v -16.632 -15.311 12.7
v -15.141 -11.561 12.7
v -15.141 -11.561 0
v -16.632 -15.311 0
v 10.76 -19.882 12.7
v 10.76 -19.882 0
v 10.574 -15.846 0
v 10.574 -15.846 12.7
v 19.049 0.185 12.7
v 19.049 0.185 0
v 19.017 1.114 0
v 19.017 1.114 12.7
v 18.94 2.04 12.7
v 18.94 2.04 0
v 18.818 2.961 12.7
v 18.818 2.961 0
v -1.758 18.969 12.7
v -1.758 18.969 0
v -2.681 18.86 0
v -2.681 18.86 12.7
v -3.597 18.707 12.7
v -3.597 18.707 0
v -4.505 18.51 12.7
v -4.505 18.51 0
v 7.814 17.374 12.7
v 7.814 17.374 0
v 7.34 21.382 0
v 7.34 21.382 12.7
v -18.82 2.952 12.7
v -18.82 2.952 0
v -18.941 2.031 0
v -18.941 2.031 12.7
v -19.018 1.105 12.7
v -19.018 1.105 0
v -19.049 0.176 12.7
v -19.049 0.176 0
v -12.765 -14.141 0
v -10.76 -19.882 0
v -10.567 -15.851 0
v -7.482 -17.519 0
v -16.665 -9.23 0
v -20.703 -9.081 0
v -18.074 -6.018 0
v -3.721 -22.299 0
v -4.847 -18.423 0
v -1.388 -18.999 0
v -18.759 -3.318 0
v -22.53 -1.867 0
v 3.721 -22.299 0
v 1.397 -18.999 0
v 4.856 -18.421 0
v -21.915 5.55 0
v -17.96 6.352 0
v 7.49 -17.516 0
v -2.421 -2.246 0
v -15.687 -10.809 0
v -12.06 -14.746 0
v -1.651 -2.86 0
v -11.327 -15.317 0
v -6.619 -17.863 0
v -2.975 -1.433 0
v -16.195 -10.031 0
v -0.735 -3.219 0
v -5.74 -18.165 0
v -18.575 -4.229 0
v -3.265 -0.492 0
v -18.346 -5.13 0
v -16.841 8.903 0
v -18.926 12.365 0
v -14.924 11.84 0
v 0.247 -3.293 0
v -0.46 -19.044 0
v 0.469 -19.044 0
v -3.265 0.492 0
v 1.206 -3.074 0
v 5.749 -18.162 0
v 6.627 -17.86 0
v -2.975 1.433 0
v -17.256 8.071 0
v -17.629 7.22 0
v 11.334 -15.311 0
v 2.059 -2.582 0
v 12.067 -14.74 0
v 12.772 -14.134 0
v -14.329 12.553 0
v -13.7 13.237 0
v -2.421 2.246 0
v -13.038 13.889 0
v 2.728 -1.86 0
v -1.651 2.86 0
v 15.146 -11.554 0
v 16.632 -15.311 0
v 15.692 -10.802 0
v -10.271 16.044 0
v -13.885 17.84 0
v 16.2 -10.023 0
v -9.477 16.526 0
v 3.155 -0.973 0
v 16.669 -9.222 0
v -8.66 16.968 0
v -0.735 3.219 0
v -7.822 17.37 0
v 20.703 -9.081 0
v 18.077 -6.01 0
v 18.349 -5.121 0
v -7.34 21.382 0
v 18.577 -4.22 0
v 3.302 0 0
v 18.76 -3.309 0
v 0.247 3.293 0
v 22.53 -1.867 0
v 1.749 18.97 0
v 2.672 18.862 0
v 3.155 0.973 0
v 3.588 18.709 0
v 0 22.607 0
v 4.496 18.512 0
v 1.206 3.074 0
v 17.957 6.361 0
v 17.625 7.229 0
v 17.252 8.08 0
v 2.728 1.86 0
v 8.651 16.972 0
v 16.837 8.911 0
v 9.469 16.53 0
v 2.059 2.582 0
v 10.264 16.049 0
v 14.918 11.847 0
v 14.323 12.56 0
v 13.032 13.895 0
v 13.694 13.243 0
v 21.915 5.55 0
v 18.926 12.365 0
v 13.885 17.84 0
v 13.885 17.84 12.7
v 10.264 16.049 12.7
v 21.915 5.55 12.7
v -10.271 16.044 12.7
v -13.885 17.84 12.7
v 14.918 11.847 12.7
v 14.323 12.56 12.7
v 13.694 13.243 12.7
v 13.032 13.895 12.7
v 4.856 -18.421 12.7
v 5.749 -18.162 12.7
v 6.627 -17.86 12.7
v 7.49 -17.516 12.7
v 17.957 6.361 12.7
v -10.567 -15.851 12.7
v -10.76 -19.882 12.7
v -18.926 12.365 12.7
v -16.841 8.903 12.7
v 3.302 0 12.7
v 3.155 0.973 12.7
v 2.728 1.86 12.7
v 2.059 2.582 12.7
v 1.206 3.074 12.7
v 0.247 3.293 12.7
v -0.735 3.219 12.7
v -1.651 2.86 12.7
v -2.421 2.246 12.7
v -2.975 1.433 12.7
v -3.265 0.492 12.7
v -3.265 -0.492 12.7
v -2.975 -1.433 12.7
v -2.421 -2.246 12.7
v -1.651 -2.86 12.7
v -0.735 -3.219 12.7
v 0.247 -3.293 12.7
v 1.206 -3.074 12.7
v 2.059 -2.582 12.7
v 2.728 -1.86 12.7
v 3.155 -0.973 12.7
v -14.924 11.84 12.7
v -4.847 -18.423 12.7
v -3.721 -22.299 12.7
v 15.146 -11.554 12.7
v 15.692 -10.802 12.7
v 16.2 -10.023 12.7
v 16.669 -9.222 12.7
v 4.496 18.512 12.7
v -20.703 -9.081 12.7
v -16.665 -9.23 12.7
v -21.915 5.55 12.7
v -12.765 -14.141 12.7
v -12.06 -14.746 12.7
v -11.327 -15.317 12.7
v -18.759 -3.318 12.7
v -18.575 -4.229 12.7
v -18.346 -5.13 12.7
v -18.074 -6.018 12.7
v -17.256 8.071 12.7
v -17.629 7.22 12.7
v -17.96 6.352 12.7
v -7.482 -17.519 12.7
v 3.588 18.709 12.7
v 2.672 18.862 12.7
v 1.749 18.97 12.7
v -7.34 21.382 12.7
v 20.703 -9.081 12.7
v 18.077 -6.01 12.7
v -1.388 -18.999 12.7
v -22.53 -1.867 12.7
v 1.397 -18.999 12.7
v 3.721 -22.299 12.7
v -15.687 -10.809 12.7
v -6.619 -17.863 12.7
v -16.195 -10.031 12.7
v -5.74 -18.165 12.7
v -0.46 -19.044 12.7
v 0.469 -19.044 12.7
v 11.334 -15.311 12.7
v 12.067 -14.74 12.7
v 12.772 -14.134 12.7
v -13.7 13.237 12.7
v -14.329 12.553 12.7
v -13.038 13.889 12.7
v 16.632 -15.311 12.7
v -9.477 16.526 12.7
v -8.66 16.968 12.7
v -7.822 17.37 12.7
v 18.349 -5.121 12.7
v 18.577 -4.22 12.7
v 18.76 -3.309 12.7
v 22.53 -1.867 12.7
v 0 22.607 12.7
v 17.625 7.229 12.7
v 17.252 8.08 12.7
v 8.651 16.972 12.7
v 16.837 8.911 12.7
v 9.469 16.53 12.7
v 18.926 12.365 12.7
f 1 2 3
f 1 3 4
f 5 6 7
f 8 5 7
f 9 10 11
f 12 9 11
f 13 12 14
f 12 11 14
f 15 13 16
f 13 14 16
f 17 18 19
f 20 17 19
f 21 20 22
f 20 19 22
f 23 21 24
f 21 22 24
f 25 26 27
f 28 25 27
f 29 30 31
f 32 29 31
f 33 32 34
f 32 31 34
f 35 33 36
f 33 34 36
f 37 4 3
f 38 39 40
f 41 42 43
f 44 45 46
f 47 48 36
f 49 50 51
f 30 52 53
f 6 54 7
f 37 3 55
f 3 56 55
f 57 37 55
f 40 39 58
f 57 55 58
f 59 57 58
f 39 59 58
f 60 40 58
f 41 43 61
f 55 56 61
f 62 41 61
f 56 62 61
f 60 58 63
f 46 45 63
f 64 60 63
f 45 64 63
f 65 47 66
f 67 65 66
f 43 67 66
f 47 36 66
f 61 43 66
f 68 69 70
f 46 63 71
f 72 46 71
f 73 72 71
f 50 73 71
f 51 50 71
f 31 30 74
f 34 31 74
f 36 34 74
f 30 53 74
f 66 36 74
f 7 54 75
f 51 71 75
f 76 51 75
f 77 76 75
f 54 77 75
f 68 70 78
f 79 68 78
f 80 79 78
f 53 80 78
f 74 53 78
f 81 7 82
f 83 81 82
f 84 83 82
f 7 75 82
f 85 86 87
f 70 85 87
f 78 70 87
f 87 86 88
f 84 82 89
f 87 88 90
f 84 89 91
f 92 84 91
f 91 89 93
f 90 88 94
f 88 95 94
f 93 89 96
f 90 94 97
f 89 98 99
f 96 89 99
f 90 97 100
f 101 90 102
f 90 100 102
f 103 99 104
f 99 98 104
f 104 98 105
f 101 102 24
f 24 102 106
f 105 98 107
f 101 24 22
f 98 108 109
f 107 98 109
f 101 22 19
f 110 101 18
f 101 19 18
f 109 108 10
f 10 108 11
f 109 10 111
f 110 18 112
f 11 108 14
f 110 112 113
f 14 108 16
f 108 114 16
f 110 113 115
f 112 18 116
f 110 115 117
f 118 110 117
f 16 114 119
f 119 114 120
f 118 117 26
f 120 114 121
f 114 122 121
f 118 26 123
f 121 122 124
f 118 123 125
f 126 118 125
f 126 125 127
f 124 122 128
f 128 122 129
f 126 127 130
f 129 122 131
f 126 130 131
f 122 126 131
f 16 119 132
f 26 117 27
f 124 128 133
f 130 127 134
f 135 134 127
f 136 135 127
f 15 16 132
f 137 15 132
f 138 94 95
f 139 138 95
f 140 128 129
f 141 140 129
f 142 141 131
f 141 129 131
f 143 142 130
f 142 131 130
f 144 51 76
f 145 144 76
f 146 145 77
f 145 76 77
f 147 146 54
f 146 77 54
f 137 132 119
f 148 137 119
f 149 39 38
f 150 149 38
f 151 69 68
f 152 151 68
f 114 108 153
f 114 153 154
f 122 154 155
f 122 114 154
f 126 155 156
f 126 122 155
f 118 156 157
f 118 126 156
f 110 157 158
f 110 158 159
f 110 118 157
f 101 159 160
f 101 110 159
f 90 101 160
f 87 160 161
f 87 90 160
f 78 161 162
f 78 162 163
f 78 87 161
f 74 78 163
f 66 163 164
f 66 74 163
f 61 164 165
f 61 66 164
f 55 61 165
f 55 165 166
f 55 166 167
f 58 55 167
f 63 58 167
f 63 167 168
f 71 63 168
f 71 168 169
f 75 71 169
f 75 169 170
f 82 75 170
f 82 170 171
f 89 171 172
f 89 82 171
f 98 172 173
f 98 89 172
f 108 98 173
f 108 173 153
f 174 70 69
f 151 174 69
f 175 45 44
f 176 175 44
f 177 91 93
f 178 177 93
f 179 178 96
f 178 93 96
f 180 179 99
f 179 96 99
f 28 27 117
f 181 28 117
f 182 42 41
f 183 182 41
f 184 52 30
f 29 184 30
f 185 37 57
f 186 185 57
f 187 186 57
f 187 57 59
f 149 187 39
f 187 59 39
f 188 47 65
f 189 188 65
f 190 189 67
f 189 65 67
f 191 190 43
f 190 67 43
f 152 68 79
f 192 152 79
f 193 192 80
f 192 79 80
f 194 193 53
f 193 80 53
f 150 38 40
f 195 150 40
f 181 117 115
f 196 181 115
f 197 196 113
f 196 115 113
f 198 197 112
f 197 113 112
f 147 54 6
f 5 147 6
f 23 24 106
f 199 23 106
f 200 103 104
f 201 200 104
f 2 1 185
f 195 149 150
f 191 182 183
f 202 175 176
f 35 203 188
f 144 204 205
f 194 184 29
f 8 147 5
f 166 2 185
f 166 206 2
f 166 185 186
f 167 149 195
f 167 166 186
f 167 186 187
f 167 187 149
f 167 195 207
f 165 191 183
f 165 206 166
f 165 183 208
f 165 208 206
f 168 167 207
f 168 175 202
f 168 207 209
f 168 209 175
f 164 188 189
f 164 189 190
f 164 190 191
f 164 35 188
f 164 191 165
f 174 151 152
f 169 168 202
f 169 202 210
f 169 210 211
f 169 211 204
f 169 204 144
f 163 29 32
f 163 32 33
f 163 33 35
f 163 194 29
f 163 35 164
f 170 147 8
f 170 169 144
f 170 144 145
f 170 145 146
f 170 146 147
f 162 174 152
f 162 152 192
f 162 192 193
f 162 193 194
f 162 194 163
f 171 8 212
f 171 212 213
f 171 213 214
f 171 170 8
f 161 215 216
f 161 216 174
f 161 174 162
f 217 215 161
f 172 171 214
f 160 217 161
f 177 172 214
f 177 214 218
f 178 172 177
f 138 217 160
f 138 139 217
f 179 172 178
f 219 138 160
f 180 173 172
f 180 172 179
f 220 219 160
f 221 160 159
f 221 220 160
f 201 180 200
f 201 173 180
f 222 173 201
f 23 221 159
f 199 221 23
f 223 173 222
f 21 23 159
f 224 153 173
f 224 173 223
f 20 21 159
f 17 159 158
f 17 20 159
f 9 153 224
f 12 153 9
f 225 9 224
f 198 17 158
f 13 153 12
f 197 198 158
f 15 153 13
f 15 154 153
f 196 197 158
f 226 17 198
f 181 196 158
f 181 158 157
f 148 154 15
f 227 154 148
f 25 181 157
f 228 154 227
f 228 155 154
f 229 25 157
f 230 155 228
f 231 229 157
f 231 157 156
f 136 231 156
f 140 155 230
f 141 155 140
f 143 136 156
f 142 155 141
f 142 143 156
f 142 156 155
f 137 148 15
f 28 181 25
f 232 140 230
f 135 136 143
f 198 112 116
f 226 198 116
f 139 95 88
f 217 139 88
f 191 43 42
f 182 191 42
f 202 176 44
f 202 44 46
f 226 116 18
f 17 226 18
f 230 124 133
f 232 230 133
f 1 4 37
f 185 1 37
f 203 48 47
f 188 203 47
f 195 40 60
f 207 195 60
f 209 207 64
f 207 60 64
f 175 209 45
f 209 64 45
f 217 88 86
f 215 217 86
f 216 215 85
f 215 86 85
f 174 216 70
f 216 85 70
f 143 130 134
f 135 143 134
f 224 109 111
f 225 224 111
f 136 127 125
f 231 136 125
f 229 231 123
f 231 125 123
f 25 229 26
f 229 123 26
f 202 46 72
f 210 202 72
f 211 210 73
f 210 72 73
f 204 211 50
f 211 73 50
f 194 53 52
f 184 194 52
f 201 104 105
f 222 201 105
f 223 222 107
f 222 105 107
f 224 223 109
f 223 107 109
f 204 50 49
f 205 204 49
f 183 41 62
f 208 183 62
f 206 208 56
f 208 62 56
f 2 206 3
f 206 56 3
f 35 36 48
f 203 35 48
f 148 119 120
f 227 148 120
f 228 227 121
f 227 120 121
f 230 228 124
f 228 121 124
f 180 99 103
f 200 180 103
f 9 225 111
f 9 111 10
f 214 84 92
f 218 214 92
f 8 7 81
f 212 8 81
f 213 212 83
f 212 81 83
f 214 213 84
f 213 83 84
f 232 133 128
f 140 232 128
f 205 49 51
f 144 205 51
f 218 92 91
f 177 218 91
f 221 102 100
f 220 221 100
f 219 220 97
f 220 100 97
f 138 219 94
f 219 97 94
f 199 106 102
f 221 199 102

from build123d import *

# Parameters (mm, degrees)
F0_R     = 3.302
F1_DEPTH = 12.7


with BuildPart() as f1:
    # F0 (on Top) → F1 (new body)
    with BuildSketch(Plane.XY):
        with BuildLine():
            Line((20.702864, -9.081118), (17.445482, -7.652298))
            ThreePointArc((17.445482, -7.652298), (17.075406, -8.445887), (16.669253, -9.221632))
            Line((16.669253, -9.221632), (20.702864, -9.081118))
        make_face()
        with BuildLine():
            Line((-22.52976, -1.866869), (-18.984935, -1.573137))
            ThreePointArc((-18.984935, -1.573137), (-19.037169, -0.699059), (-19.049182, 0.176495))
            Line((-19.049182, 0.176495), (-22.52976, -1.866869))
        make_face()
        with BuildLine():
            Line((-22.52976, -1.866869), (-18.75876, -3.318344))
            ThreePointArc((-18.75876, -3.318344), (-18.892011, -2.448353), (-18.984935, -1.573137))
            Line((-18.984935, -1.573137), (-22.52976, -1.866869))
        make_face()
        with BuildLine():
            Line((3.720986, -22.298645), (3.135527, -18.790183))
            ThreePointArc((3.135527, -18.790183), (2.268748, -18.91442), (1.397176, -18.998695))
            Line((1.397176, -18.998695), (3.720986, -22.298645))
        make_face()
        with BuildLine():
            Line((20.702864, -9.081118), (18.077194, -6.009787))
            ThreePointArc((18.077194, -6.009787), (17.780315, -6.838341), (17.445482, -7.652298))
            Line((17.445482, -7.652298), (20.702864, -9.081118))
        make_face()
        with BuildLine():
            Line((-3.720986, -22.298645), (-3.135527, -18.790183))
            ThreePointArc((-3.135527, -18.790183), (-3.995681, -18.626246), (-4.847393, -18.422955))
            Line((-4.847393, -18.422955), (-3.720986, -22.298645))
        make_face()
        with BuildLine():
            Line((-20.702864, -9.081118), (-17.445482, -7.652298))
            ThreePointArc((-17.445482, -7.652298), (-17.778699, -6.842541), (-18.074353, -6.018327))
            Line((-18.074353, -6.018327), (-20.702864, -9.081118))
        make_face()
        with BuildLine():
            Line((22.52976, -1.866869), (18.984935, -1.573137))
            ThreePointArc((18.984935, -1.573137), (18.892588, -2.44389), (18.760326, -3.309481))
            Line((18.760326, -3.309481), (22.52976, -1.866869))
        make_face()
        with BuildLine():
            Line((3.720986, -22.298645), (4.856096, -18.420663))
            ThreePointArc((4.856096, -18.420663), (4.000081, -18.625301), (3.135527, -18.790183))
            Line((3.135527, -18.790183), (3.720986, -22.298645))
        make_face()
        with BuildLine():
            Line((-3.720986, -22.298645), (-1.3882, -18.999353))
            ThreePointArc((-1.3882, -18.999353), (-2.26428, -18.914955), (-3.135527, -18.790183))
            Line((-3.135527, -18.790183), (-3.720986, -22.298645))
        make_face()
        with BuildLine():
            ThreePointArc((19.049097, 0.185495), (19.049774, 0.092749), (19.05, 0))
            ThreePointArc((19.05, 0), (19.033727, -0.787241), (18.984935, -1.573137))
            Line((18.984935, -1.573137), (22.52976, -1.866869))
            Line((22.52976, -1.866869), (19.049097, 0.185495))
        make_face()
        with BuildLine():
            Line((-20.702864, -9.081118), (-16.664895, -9.229506))
            ThreePointArc((-16.664895, -9.229506), (-17.07341, -8.44992), (-17.445482, -7.652298))
            Line((-17.445482, -7.652298), (-20.702864, -9.081118))
        make_face()
        with BuildLine():
            ThreePointArc((-15.948021, 10.419362), (-15.452372, 11.141216), (-14.924076, 11.83953))
            Line((-14.924076, 11.83953), (-18.925801, 12.364843))
            Line((-18.925801, 12.364843), (-15.948021, 10.419362))
        make_face()
        with BuildLine():
            ThreePointArc((-11.700752, 15.033127), (-10.997573, 15.554931), (-10.271159, 16.043871))
            Line((-10.271159, 16.043871), (-13.885491, 17.840079))
            Line((-13.885491, 17.840079), (-11.700752, 15.033127))
        make_face()
        with BuildLine():
            ThreePointArc((-16.841467, 8.90323), (-16.412261, 9.671618), (-15.948021, 10.419362))
            Line((-15.948021, 10.419362), (-18.925801, 12.364843))
            Line((-18.925801, 12.364843), (-16.841467, 8.90323))
        make_face()
        with BuildLine():
            ThreePointArc((-13.038076, 13.889243), (-12.38263, 14.476636), (-11.700752, 15.033127))
            Line((-11.700752, 15.033127), (-13.885491, 17.840079))
            Line((-13.885491, 17.840079), (-13.038076, 13.889243))
        make_face()
        with BuildLine():
            ThreePointArc((18.467075, 4.676499), (18.662466, 3.82294), (18.818427, 2.961304))
            Line((18.818427, 2.961304), (21.915207, 5.549684))
            Line((21.915207, 5.549684), (18.467075, 4.676499))
        make_face()
        with BuildLine():
            ThreePointArc((17.956734, 6.360676), (18.231363, 5.524484), (18.467075, 4.676499))
            Line((18.467075, 4.676499), (21.915207, 5.549684))
            Line((21.915207, 5.549684), (17.956734, 6.360676))
        make_face()
        with BuildLine():
            ThreePointArc((15.948021, 10.419362), (16.409975, 9.675495), (16.837258, 8.911186))
            Line((16.837258, 8.911186), (18.925801, 12.364843))
            Line((18.925801, 12.364843), (15.948021, 10.419362))
        make_face()
        with BuildLine():
            ThreePointArc((14.91848, 11.846579), (15.44974, 11.144866), (15.948021, 10.419362))
            Line((15.948021, 10.419362), (18.925801, 12.364843))
            Line((18.925801, 12.364843), (14.91848, 11.846579))
        make_face()
        with BuildLine():
            ThreePointArc((11.700752, 15.033127), (12.37921, 14.47956), (13.031512, 13.895402))
            Line((13.031512, 13.895402), (13.885491, 17.840079))
            Line((13.885491, 17.840079), (11.700752, 15.033127))
        make_face()
        with BuildLine():
            ThreePointArc((10.263578, 16.048722), (10.993899, 15.557528), (11.700752, 15.033127))
            Line((11.700752, 15.033127), (13.885491, 17.840079))
            Line((13.885491, 17.840079), (10.263578, 16.048722))
        make_face()
        with BuildLine():
            ThreePointArc((6.185525, 18.017818), (7.006964, 17.714541), (7.813599, 17.373836))
            Line((7.813599, 17.373836), (7.340473, 21.382066))
            Line((7.340473, 21.382066), (6.185525, 18.017818))
        make_face()
        with BuildLine():
            ThreePointArc((4.496458, 18.511736), (5.346698, 18.284292), (6.185525, 18.017818))
            Line((6.185525, 18.017818), (7.340473, 21.382066))
            Line((7.340473, 21.382066), (4.496458, 18.511736))
        make_face()
        with BuildLine():
            ThreePointArc((0, 19.05), (0.875406, 19.029876), (1.748962, 18.969545))
            Line((1.748962, 18.969545), (0, 22.606974))
            Line((0, 22.606974), (0, 19.05))
        make_face()
        with BuildLine():
            ThreePointArc((-1.757924, 18.968716), (-0.879901, 19.029668), (0, 19.05))
            Line((0, 19.05), (0, 22.606974))
            Line((0, 22.606974), (-1.757924, 18.968716))
        make_face()
        with BuildLine():
            ThreePointArc((-6.185525, 18.017818), (-5.351017, 18.283028), (-4.505203, 18.50961))
            Line((-4.505203, 18.50961), (-7.340473, 21.382066))
            Line((-7.340473, 21.382066), (-6.185525, 18.017818))
        make_face()
        with BuildLine():
            ThreePointArc((-7.821807, 17.370142), (-7.011149, 17.712885), (-6.185525, 18.017818))
            Line((-6.185525, 18.017818), (-7.340473, 21.382066))
            Line((-7.340473, 21.382066), (-7.821807, 17.370142))
        make_face()
        with BuildLine():
            Line((-16.632492, -15.311287), (-14.01554, -12.902214))
            ThreePointArc((-14.01554, -12.902214), (-14.593631, -12.244527), (-15.140887, -11.56097))
            Line((-15.140887, -11.56097), (-16.632492, -15.311287))
        make_face()
        with BuildLine():
            ThreePointArc((-18.467075, 4.676499), (-18.232667, 5.520177), (-17.959737, 6.352192))
            Line((-17.959737, 6.352192), (-21.915207, 5.549684))
            Line((-21.915207, 5.549684), (-18.467075, 4.676499))
        make_face()
        with BuildLine():
            Line((16.632492, -15.311287), (14.01554, -12.902214))
            ThreePointArc((14.01554, -12.902214), (13.407838, -13.532641), (12.771808, -14.134476))
            Line((12.771808, -14.134476), (16.632492, -15.311287))
        make_face()
        with BuildLine():
            Line((-16.632492, -15.311287), (-12.765129, -14.140509))
            ThreePointArc((-12.765129, -14.140509), (-13.404641, -13.535808), (-14.01554, -12.902214))
            Line((-14.01554, -12.902214), (-16.632492, -15.311287))
        make_face()
        with BuildLine():
            ThreePointArc((-18.819824, 2.952413), (-18.663368, 3.818531), (-18.467075, 4.676499))
            Line((-18.467075, 4.676499), (-21.915207, 5.549684))
            Line((-21.915207, 5.549684), (-18.819824, 2.952413))
        make_face()
        with BuildLine():
            Line((16.632492, -15.311287), (15.146348, -11.553816))
            ThreePointArc((15.146348, -11.553816), (14.596523, -12.241079), (14.01554, -12.902214))
            Line((14.01554, -12.902214), (16.632492, -15.311287))
        make_face()
        with BuildLine():
            ThreePointArc((18.984935, -1.573137), (19.033727, -0.787241), (19.05, 0))
            ThreePointArc((19.05, 0), (19.049774, 0.092749), (19.049097, 0.185495))
            ThreePointArc((19.049097, 0.185495), (18.984562, 1.577621), (18.818427, 2.961304))
            ThreePointArc((18.818427, 2.961304), (18.662466, 3.82294), (18.467075, 4.676499))
            ThreePointArc((18.467075, 4.676499), (18.231363, 5.524484), (17.956734, 6.360676))
            ThreePointArc((17.956734, 6.360676), (17.443674, 7.656419), (16.837258, 8.911186))
            ThreePointArc((16.837258, 8.911186), (16.409975, 9.675495), (15.948021, 10.419362))
            ThreePointArc((15.948021, 10.419362), (15.44974, 11.144866), (14.91848, 11.846579))
            ThreePointArc((14.91848, 11.846579), (14.012492, 12.905524), (13.031512, 13.895402))
            ThreePointArc((13.031512, 13.895402), (12.37921, 14.47956), (11.700752, 15.033127))
            ThreePointArc((11.700752, 15.033127), (10.993899, 15.557528), (10.263578, 16.048722))
            ThreePointArc((10.263578, 16.048722), (9.06284, 16.756116), (7.813599, 17.373836))
            ThreePointArc((7.813599, 17.373836), (7.006964, 17.714541), (6.185525, 18.017818))
            ThreePointArc((6.185525, 18.017818), (5.346698, 18.284292), (4.496458, 18.511736))
            ThreePointArc((4.496458, 18.511736), (3.131088, 18.790923), (1.748962, 18.969545))
            ThreePointArc((1.748962, 18.969545), (0.875406, 19.029876), (0, 19.05))
            ThreePointArc((0, 19.05), (-0.879901, 19.029668), (-1.757924, 18.968716))
            ThreePointArc((-1.757924, 18.968716), (-3.139966, 18.789442), (-4.505203, 18.50961))
            ThreePointArc((-4.505203, 18.50961), (-5.351017, 18.283028), (-6.185525, 18.017818))
            ThreePointArc((-6.185525, 18.017818), (-7.011149, 17.712885), (-7.821807, 17.370142))
            ThreePointArc((-7.821807, 17.370142), (-9.070755, 16.751833), (-10.271159, 16.043871))
            ThreePointArc((-10.271159, 16.043871), (-10.997573, 15.554931), (-11.700752, 15.033127))
            ThreePointArc((-11.700752, 15.033127), (-12.38263, 14.476636), (-13.038076, 13.889243))
            ThreePointArc((-13.038076, 13.889243), (-14.018588, 12.898903), (-14.924076, 11.83953))
            ThreePointArc((-14.924076, 11.83953), (-15.452372, 11.141216), (-15.948021, 10.419362))
            ThreePointArc((-15.948021, 10.419362), (-16.412261, 9.671618), (-16.841467, 8.90323))
            ThreePointArc((-16.841467, 8.90323), (-17.447289, 7.648177), (-17.959737, 6.352192))
            ThreePointArc((-17.959737, 6.352192), (-18.232667, 5.520177), (-18.467075, 4.676499))
            ThreePointArc((-18.467075, 4.676499), (-18.663368, 3.818531), (-18.819824, 2.952413))
            ThreePointArc((-18.819824, 2.952413), (-18.985306, 1.568652), (-19.049182, 0.176495))
            ThreePointArc((-19.049182, 0.176495), (-19.037169, -0.699059), (-18.984935, -1.573137))
            ThreePointArc((-18.984935, -1.573137), (-18.892011, -2.448353), (-18.75876, -3.318344))
            ThreePointArc((-18.75876, -3.318344), (-18.46597, -4.680861), (-18.074353, -6.018327))
            ThreePointArc((-18.074353, -6.018327), (-17.778699, -6.842541), (-17.445482, -7.652298))
            ThreePointArc((-17.445482, -7.652298), (-17.07341, -8.44992), (-16.664895, -9.229506))
            ThreePointArc((-16.664895, -9.229506), (-15.94556, -10.423129), (-15.140887, -11.56097))
            ThreePointArc((-15.140887, -11.56097), (-14.593631, -12.244527), (-14.01554, -12.902214))
            ThreePointArc((-14.01554, -12.902214), (-13.404641, -13.535808), (-12.765129, -14.140509))
            ThreePointArc((-12.765129, -14.140509), (-11.697201, -15.03589), (-10.566671, -15.850803))
            ThreePointArc((-10.566671, -15.850803), (-9.827116, -16.319629), (-9.066798, -16.753975))
            ThreePointArc((-9.066798, -16.753975), (-8.283271, -17.15488), (-7.482063, -17.519167))
            ThreePointArc((-7.482063, -17.519167), (-6.181268, -18.019279), (-4.847393, -18.422955))
            ThreePointArc((-4.847393, -18.422955), (-3.995681, -18.626246), (-3.135527, -18.790183))
            ThreePointArc((-3.135527, -18.790183), (-2.26428, -18.914955), (-1.3882, -18.999353))
            ThreePointArc((-1.3882, -18.999353), (0.0045, -19.049999), (1.397176, -18.998695))
            ThreePointArc((1.397176, -18.998695), (2.268748, -18.91442), (3.135527, -18.790183))
            ThreePointArc((3.135527, -18.790183), (4.000081, -18.625301), (4.856096, -18.420663))
            ThreePointArc((4.856096, -18.420663), (6.189781, -18.016357), (7.49034, -17.515631))
            ThreePointArc((7.49034, -17.515631), (8.287323, -17.152923), (9.066798, -16.753975))
            ThreePointArc((9.066798, -16.753975), (9.830971, -16.317307), (10.574159, -15.845809))
            ThreePointArc((10.574159, -15.845809), (11.704303, -15.030362), (12.771808, -14.134476))
            ThreePointArc((12.771808, -14.134476), (13.407838, -13.532641), (14.01554, -12.902214))
            ThreePointArc((14.01554, -12.902214), (14.596523, -12.241079), (15.146348, -11.553816))
            ThreePointArc((15.146348, -11.553816), (15.950482, -10.415595), (16.669253, -9.221632))
            ThreePointArc((16.669253, -9.221632), (17.075406, -8.445887), (17.445482, -7.652298))
            ThreePointArc((17.445482, -7.652298), (17.780315, -6.838341), (18.077194, -6.009787))
            ThreePointArc((18.077194, -6.009787), (18.468179, -4.672136), (18.760326, -3.309481))
            ThreePointArc((18.760326, -3.309481), (18.892588, -2.44389), (18.984935, -1.573137))
        make_face()
        Circle(F0_R, mode=Mode.SUBTRACT)
        with BuildLine():
            Line((-10.759731, -19.882241), (-7.482063, -17.519167))
            ThreePointArc((-7.482063, -17.519167), (-8.283271, -17.15488), (-9.066798, -16.753975))
            Line((-9.066798, -16.753975), (-10.759731, -19.882241))
        make_face()
        with BuildLine():
            Line((-10.759731, -19.882241), (-9.066798, -16.753975))
            ThreePointArc((-9.066798, -16.753975), (-9.827116, -16.319629), (-10.566671, -15.850803))
            Line((-10.566671, -15.850803), (-10.759731, -19.882241))
        make_face()
        with BuildLine():
            Line((10.759731, -19.882241), (10.574159, -15.845809))
            ThreePointArc((10.574159, -15.845809), (9.830971, -16.317307), (9.066798, -16.753975))
            Line((9.066798, -16.753975), (10.759731, -19.882241))
        make_face()
        with BuildLine():
            Line((10.759731, -19.882241), (9.066798, -16.753975))
            ThreePointArc((9.066798, -16.753975), (8.287323, -17.152923), (7.49034, -17.515631))
            Line((7.49034, -17.515631), (10.759731, -19.882241))
        make_face()
    extrude(amount=F1_DEPTH)


solid = f1.part
